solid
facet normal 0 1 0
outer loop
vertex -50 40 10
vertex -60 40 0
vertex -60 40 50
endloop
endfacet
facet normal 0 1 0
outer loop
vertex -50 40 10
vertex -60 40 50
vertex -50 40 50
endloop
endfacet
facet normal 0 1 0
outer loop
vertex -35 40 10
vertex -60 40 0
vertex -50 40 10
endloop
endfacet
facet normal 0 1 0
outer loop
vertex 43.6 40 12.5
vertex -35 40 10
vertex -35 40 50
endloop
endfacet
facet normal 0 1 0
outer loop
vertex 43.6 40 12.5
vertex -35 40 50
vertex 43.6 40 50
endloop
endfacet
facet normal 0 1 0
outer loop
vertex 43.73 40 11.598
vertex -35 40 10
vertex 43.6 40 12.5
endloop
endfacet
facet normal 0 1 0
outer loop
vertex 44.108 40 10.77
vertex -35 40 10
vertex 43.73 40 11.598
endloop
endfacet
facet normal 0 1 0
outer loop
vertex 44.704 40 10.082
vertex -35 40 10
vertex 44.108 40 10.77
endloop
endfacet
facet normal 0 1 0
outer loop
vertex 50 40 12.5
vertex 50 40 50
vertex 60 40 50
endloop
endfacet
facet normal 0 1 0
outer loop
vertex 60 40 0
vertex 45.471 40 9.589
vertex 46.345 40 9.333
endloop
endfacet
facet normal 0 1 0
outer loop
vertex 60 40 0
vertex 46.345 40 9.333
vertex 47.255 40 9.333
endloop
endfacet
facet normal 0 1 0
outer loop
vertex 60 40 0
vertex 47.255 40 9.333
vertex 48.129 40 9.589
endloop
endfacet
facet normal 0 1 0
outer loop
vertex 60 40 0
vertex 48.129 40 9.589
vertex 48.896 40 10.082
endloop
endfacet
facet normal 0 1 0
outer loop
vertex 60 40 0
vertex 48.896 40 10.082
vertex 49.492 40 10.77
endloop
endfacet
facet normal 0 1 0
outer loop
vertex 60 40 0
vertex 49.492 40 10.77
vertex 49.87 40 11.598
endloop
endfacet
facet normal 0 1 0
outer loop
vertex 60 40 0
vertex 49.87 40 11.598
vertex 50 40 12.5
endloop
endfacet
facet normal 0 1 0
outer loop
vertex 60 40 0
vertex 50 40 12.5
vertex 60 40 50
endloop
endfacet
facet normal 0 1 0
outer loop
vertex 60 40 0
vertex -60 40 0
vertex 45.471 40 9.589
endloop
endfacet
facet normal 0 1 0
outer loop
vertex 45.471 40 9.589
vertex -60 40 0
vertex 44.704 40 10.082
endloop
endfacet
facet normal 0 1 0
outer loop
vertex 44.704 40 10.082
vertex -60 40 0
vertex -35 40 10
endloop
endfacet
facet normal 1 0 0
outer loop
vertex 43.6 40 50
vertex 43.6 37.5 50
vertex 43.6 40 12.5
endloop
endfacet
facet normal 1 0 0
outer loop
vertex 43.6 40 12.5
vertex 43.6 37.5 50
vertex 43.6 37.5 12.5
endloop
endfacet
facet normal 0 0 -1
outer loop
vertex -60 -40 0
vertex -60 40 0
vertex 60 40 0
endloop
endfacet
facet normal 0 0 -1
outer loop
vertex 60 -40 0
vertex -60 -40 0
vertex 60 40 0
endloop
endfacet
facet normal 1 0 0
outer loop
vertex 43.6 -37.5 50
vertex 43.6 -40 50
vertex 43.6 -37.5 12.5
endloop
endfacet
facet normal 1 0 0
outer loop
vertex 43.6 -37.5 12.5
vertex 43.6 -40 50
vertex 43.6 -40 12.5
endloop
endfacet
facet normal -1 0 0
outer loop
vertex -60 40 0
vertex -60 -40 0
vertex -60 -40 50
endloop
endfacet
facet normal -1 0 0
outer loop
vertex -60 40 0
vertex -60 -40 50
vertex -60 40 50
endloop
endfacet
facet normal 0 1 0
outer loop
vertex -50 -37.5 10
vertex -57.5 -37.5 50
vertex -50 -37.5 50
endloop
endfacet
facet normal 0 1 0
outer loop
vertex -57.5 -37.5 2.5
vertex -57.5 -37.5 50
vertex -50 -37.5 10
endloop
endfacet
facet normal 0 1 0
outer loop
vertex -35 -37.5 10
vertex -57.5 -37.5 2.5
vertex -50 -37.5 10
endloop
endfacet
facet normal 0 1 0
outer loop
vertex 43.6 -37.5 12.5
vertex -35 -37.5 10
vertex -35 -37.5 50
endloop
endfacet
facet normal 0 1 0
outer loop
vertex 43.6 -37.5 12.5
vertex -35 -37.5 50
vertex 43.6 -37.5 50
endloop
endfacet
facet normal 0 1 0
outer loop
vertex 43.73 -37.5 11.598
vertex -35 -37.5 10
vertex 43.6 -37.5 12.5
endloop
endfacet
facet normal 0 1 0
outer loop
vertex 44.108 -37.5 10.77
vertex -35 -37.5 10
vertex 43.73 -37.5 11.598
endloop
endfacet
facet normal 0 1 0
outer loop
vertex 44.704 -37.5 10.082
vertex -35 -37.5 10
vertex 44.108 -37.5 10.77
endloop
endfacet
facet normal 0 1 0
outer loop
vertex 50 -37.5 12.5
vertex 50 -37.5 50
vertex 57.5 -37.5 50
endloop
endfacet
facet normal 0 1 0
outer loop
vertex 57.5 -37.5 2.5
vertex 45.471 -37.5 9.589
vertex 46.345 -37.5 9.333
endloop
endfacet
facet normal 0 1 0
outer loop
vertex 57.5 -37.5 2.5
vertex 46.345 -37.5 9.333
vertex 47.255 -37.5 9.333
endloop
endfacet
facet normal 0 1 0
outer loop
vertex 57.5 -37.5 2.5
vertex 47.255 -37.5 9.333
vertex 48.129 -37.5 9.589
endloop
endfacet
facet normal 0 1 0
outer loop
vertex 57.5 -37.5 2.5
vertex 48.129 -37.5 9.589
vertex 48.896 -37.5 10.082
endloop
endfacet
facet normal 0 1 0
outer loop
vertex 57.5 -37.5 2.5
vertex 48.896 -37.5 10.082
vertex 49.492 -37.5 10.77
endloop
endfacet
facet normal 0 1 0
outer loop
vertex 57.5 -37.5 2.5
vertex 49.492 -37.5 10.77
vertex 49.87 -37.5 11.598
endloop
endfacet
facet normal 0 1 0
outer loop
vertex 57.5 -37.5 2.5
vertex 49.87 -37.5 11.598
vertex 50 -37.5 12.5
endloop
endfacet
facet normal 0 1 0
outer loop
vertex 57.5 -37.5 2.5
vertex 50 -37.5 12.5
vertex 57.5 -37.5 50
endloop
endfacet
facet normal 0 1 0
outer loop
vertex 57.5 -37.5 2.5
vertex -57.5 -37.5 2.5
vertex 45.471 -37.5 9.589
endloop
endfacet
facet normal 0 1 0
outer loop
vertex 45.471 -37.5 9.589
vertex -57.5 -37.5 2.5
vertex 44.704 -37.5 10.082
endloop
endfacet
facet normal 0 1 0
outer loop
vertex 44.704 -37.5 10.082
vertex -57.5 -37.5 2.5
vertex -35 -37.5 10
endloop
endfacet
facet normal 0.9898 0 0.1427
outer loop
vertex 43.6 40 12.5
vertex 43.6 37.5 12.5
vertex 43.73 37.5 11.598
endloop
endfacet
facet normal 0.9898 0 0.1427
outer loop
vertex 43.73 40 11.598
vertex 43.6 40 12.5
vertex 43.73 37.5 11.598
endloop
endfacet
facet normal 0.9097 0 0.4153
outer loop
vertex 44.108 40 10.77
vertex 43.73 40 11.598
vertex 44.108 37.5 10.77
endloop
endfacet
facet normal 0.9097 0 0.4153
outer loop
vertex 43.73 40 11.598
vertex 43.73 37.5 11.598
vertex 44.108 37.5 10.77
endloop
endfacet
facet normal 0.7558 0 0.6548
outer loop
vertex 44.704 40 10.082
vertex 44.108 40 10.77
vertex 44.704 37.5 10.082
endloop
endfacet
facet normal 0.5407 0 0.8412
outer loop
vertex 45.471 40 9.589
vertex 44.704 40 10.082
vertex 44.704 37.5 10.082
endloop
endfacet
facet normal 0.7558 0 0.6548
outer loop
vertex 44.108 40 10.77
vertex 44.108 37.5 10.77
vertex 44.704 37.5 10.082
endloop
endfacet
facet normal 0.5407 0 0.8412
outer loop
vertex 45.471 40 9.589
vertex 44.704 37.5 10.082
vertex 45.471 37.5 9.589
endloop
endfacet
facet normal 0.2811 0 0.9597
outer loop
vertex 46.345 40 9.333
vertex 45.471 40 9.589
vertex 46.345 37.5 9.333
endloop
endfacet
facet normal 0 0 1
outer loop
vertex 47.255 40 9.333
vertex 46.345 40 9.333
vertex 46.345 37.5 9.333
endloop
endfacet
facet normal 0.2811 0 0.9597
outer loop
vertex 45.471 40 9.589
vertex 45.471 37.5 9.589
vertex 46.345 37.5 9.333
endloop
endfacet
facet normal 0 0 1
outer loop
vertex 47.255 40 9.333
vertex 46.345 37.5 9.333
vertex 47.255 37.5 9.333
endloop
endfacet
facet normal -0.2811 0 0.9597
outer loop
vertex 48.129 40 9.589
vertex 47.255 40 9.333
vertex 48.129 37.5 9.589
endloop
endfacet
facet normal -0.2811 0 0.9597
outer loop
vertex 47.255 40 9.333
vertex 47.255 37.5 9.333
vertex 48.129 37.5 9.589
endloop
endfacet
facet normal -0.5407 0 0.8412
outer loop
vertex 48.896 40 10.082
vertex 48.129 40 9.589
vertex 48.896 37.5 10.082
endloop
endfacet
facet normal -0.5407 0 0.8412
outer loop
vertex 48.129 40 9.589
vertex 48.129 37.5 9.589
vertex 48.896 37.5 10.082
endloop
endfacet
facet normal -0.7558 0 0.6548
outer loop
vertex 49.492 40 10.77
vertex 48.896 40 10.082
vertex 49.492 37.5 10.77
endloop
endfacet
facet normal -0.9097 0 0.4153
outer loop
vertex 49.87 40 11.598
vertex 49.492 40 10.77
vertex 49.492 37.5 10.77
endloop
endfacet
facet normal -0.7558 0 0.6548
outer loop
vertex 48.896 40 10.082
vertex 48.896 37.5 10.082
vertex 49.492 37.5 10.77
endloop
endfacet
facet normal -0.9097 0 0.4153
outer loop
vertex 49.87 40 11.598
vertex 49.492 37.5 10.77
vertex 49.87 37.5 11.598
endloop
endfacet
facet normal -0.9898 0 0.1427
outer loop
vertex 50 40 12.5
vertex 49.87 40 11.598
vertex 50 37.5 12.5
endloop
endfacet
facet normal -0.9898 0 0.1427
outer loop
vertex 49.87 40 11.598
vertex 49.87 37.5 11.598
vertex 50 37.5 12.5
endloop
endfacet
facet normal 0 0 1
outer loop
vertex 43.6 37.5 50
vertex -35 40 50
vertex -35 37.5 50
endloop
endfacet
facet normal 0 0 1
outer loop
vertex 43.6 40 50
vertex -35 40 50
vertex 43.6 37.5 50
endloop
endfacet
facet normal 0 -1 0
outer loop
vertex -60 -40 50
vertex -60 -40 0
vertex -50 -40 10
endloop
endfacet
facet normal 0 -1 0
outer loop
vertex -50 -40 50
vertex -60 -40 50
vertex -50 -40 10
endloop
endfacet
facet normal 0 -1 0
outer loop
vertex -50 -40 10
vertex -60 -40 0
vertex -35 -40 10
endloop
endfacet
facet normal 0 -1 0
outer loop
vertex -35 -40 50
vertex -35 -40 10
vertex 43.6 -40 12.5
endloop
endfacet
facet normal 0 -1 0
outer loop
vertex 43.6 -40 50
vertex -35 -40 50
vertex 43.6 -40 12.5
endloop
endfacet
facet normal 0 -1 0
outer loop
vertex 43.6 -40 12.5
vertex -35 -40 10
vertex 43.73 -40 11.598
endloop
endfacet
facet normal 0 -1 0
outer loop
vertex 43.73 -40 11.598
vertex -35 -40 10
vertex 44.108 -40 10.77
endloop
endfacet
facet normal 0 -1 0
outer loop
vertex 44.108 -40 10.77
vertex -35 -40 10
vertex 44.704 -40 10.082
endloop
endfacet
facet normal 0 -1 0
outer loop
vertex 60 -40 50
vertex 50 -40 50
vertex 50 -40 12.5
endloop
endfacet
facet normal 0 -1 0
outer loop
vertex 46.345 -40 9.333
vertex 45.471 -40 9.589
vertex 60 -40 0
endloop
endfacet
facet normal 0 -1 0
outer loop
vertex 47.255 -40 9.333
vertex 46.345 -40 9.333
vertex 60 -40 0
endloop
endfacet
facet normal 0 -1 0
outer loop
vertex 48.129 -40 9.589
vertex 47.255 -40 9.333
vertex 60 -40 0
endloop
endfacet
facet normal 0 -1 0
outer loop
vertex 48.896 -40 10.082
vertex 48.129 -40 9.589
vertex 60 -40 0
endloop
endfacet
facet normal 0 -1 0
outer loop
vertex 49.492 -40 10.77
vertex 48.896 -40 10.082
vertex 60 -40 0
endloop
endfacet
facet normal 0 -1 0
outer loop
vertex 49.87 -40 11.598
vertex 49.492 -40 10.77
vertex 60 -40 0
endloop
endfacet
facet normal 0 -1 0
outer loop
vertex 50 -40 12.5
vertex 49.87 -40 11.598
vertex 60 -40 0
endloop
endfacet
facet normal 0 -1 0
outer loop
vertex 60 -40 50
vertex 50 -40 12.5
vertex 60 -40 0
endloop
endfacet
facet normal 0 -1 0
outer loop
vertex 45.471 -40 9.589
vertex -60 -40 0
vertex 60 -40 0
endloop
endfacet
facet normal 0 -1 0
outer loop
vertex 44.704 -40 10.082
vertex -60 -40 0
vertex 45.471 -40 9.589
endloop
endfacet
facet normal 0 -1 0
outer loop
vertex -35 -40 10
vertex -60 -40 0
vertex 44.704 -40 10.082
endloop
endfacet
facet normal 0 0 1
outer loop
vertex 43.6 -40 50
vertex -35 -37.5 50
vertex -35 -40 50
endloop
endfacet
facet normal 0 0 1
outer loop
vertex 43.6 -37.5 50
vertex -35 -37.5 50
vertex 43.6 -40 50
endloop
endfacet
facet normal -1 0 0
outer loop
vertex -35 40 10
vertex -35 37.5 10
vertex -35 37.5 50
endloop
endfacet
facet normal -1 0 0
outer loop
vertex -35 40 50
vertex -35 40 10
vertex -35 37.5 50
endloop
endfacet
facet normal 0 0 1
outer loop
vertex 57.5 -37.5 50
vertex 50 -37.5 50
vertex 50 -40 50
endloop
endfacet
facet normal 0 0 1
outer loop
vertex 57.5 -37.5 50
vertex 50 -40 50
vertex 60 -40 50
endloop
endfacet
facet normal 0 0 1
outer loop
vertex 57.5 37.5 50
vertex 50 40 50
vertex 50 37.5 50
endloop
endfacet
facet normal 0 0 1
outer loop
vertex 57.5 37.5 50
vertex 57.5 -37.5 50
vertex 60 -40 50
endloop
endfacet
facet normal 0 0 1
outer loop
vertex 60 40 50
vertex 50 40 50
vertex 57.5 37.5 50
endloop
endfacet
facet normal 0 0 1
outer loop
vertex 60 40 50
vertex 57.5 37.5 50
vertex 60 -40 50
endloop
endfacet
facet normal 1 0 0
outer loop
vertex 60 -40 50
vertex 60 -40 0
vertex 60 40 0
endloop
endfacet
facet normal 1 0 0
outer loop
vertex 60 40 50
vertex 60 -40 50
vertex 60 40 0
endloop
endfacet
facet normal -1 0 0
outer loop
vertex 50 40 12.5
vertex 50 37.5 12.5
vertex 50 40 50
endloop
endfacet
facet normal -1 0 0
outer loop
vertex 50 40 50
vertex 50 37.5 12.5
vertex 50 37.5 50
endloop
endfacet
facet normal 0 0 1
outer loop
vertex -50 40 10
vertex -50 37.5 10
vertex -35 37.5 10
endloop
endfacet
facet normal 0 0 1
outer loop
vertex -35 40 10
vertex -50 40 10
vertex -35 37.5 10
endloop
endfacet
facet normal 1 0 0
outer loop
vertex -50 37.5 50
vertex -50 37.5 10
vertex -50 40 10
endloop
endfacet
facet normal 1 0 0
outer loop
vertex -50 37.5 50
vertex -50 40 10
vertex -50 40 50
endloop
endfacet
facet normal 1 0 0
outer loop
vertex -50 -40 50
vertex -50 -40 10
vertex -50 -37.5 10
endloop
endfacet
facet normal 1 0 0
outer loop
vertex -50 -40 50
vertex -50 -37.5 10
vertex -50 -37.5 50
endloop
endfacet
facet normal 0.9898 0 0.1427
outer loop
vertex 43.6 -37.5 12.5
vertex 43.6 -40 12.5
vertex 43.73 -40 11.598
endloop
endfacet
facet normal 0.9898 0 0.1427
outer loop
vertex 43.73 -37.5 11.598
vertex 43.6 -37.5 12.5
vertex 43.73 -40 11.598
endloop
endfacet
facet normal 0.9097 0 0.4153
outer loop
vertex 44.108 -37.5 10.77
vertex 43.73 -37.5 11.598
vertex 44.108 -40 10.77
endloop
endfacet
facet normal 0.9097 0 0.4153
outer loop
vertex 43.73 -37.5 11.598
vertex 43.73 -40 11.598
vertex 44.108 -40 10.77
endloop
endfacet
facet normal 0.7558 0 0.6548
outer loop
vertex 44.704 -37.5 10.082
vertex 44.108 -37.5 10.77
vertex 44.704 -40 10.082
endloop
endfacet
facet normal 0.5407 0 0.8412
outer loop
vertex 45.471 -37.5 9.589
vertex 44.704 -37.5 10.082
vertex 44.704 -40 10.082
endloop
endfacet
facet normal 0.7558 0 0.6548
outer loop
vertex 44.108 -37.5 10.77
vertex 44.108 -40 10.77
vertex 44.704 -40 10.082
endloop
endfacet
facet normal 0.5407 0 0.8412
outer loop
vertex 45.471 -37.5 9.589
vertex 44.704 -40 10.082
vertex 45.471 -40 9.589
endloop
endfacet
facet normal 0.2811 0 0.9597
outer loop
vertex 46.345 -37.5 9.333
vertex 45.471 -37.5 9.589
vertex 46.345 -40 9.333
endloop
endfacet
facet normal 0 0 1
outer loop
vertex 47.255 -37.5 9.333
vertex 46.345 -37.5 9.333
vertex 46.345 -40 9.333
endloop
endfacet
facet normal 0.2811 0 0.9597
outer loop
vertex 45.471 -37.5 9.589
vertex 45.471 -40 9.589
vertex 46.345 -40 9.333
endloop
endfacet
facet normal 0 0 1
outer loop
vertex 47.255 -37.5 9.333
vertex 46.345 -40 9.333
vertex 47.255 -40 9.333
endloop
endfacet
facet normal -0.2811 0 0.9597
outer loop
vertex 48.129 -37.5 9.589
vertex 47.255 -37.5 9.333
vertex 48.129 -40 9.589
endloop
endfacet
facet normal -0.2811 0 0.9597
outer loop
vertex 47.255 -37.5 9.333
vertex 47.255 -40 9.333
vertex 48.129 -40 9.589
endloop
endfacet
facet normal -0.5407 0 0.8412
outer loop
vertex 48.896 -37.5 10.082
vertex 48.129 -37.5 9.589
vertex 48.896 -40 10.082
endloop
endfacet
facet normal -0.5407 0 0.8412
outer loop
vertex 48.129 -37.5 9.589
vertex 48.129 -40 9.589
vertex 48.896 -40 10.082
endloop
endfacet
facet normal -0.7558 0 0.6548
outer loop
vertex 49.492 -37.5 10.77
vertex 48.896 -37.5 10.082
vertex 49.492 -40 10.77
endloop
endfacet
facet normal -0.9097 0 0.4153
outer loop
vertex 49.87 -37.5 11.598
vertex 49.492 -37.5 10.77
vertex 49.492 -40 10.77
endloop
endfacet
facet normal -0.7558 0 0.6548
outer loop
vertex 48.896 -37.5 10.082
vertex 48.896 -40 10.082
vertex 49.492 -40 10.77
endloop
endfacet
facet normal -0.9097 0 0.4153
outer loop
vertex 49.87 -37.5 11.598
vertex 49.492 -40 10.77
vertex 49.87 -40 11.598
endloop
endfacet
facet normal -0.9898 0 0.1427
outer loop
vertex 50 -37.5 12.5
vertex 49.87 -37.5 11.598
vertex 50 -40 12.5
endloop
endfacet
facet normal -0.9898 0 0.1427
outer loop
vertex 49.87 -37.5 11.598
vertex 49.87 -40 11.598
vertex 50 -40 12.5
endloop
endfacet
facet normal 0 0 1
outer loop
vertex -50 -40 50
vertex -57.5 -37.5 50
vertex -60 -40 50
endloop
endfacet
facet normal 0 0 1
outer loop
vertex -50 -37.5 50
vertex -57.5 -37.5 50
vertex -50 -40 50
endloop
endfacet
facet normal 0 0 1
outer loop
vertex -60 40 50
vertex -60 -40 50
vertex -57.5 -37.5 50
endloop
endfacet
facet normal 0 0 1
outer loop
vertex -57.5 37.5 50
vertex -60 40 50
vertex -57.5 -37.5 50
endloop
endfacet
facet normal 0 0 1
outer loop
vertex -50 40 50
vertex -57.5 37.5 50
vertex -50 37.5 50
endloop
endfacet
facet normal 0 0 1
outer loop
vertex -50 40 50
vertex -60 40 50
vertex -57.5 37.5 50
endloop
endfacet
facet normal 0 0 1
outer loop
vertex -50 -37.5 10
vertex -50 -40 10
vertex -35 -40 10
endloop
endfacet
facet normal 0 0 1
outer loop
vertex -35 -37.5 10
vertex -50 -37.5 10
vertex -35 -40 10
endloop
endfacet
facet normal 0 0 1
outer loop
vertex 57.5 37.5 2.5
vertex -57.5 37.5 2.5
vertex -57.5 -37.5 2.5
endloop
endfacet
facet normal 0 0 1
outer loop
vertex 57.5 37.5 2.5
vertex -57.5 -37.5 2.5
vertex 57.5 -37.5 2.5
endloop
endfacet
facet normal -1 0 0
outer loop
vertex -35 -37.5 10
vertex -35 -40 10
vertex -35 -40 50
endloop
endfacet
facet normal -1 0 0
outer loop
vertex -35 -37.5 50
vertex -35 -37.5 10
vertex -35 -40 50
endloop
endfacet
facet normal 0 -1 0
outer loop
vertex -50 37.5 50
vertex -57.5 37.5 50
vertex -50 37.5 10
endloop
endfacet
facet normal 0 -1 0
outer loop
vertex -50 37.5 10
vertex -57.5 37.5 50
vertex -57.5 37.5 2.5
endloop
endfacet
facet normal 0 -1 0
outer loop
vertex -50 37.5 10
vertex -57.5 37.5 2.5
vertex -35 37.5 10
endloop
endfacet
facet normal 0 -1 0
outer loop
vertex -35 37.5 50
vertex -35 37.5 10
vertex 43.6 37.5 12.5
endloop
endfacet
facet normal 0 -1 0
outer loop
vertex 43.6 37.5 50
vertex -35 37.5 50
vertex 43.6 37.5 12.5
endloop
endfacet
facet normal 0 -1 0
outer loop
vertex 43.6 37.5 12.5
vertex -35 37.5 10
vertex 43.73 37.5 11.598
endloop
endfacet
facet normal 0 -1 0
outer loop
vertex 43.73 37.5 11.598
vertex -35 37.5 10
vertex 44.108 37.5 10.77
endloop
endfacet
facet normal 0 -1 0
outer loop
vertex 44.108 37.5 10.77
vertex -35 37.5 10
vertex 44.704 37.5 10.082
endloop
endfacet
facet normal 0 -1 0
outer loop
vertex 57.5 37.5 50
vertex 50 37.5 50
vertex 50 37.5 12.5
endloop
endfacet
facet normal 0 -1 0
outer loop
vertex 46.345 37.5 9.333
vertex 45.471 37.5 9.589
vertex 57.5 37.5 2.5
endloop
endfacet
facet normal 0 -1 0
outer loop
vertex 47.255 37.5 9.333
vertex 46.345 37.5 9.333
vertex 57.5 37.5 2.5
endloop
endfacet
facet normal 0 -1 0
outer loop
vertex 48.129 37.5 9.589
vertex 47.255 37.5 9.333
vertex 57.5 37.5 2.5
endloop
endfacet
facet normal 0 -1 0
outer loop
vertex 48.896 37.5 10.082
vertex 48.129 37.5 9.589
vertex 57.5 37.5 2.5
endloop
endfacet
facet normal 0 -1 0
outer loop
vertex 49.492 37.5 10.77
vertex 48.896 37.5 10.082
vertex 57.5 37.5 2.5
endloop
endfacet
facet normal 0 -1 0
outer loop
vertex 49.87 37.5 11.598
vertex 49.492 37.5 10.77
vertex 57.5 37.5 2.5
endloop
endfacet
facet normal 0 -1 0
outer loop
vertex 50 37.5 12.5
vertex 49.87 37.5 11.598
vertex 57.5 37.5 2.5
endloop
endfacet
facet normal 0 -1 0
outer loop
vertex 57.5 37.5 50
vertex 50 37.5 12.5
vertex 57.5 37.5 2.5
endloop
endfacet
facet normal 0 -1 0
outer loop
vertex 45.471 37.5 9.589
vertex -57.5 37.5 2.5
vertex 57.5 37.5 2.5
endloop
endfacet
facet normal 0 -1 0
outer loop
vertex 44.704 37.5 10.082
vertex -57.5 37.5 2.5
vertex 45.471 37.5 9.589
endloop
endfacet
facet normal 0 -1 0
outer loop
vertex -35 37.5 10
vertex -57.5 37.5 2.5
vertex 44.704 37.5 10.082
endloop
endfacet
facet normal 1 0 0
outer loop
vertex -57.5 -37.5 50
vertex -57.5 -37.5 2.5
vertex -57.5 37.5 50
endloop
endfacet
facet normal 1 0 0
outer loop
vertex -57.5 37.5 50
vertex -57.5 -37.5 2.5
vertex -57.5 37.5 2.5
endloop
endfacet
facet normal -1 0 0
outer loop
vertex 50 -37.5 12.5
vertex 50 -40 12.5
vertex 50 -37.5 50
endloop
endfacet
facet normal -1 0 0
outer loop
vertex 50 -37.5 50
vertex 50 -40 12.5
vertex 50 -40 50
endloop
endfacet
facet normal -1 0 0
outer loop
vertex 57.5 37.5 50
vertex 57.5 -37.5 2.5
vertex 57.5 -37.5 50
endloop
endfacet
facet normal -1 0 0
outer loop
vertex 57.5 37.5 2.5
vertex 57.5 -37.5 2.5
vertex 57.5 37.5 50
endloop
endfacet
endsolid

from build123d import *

# Parameters (mm, degrees)
SKETCH_1_W               = 120
SKETCH_1_H               = 80
EXTRUDE_1_DEPTH          = 50
SHELL_1_T                = -2.5
SKETCH_2_W               = 15
SKETCH_2_H               = 40
CUT_EXTRUDE_1_DEPTH      = 90
CUT_EXTRUDE_3_DEPTH      = 1
CUT_EXTRUDE_3_DEPTH_BACK = 81


with BuildPart() as part:
    # 草圖1 → 填料-伸長1 (new body)
    with BuildSketch(Plane.XY):
        Rectangle(SKETCH_1_W, SKETCH_1_H)
    extrude(amount=EXTRUDE_1_DEPTH)

    # 薄殼1
    shell_1_openings = [part.faces().sort_by_distance(p)[0] for p in [
        (0, 0, 50),
    ]]
    offset(amount=SHELL_1_T, openings=shell_1_openings, kind=Kind.INTERSECTION)

    # 草圖2 → 除料-伸長1 (cut)
    with BuildSketch(Plane.XZ.offset(40)):
        with Locations((-42.5, 30)):
            Rectangle(SKETCH_2_W, SKETCH_2_H)
    extrude(amount=-CUT_EXTRUDE_1_DEPTH, mode=Mode.SUBTRACT)

    # 草圖3 → 除料-伸長3 (cut, two sides)
    with BuildSketch(Plane.XZ.offset(40)) as cut_extrude_3_sk:
        with BuildLine():
            Line((43.6, 50), (43.6, 12.5))
            ThreePointArc((43.6, 12.5), (46.8, 9.3), (50, 12.5))
            Line((50, 12.5), (50, 50))
            Line((50, 50), (43.6, 50))
        make_face()
    extrude(amount=CUT_EXTRUDE_3_DEPTH, mode=Mode.SUBTRACT)
    extrude(cut_extrude_3_sk.sketch, amount=-CUT_EXTRUDE_3_DEPTH_BACK, mode=Mode.SUBTRACT)


solid = part.part
